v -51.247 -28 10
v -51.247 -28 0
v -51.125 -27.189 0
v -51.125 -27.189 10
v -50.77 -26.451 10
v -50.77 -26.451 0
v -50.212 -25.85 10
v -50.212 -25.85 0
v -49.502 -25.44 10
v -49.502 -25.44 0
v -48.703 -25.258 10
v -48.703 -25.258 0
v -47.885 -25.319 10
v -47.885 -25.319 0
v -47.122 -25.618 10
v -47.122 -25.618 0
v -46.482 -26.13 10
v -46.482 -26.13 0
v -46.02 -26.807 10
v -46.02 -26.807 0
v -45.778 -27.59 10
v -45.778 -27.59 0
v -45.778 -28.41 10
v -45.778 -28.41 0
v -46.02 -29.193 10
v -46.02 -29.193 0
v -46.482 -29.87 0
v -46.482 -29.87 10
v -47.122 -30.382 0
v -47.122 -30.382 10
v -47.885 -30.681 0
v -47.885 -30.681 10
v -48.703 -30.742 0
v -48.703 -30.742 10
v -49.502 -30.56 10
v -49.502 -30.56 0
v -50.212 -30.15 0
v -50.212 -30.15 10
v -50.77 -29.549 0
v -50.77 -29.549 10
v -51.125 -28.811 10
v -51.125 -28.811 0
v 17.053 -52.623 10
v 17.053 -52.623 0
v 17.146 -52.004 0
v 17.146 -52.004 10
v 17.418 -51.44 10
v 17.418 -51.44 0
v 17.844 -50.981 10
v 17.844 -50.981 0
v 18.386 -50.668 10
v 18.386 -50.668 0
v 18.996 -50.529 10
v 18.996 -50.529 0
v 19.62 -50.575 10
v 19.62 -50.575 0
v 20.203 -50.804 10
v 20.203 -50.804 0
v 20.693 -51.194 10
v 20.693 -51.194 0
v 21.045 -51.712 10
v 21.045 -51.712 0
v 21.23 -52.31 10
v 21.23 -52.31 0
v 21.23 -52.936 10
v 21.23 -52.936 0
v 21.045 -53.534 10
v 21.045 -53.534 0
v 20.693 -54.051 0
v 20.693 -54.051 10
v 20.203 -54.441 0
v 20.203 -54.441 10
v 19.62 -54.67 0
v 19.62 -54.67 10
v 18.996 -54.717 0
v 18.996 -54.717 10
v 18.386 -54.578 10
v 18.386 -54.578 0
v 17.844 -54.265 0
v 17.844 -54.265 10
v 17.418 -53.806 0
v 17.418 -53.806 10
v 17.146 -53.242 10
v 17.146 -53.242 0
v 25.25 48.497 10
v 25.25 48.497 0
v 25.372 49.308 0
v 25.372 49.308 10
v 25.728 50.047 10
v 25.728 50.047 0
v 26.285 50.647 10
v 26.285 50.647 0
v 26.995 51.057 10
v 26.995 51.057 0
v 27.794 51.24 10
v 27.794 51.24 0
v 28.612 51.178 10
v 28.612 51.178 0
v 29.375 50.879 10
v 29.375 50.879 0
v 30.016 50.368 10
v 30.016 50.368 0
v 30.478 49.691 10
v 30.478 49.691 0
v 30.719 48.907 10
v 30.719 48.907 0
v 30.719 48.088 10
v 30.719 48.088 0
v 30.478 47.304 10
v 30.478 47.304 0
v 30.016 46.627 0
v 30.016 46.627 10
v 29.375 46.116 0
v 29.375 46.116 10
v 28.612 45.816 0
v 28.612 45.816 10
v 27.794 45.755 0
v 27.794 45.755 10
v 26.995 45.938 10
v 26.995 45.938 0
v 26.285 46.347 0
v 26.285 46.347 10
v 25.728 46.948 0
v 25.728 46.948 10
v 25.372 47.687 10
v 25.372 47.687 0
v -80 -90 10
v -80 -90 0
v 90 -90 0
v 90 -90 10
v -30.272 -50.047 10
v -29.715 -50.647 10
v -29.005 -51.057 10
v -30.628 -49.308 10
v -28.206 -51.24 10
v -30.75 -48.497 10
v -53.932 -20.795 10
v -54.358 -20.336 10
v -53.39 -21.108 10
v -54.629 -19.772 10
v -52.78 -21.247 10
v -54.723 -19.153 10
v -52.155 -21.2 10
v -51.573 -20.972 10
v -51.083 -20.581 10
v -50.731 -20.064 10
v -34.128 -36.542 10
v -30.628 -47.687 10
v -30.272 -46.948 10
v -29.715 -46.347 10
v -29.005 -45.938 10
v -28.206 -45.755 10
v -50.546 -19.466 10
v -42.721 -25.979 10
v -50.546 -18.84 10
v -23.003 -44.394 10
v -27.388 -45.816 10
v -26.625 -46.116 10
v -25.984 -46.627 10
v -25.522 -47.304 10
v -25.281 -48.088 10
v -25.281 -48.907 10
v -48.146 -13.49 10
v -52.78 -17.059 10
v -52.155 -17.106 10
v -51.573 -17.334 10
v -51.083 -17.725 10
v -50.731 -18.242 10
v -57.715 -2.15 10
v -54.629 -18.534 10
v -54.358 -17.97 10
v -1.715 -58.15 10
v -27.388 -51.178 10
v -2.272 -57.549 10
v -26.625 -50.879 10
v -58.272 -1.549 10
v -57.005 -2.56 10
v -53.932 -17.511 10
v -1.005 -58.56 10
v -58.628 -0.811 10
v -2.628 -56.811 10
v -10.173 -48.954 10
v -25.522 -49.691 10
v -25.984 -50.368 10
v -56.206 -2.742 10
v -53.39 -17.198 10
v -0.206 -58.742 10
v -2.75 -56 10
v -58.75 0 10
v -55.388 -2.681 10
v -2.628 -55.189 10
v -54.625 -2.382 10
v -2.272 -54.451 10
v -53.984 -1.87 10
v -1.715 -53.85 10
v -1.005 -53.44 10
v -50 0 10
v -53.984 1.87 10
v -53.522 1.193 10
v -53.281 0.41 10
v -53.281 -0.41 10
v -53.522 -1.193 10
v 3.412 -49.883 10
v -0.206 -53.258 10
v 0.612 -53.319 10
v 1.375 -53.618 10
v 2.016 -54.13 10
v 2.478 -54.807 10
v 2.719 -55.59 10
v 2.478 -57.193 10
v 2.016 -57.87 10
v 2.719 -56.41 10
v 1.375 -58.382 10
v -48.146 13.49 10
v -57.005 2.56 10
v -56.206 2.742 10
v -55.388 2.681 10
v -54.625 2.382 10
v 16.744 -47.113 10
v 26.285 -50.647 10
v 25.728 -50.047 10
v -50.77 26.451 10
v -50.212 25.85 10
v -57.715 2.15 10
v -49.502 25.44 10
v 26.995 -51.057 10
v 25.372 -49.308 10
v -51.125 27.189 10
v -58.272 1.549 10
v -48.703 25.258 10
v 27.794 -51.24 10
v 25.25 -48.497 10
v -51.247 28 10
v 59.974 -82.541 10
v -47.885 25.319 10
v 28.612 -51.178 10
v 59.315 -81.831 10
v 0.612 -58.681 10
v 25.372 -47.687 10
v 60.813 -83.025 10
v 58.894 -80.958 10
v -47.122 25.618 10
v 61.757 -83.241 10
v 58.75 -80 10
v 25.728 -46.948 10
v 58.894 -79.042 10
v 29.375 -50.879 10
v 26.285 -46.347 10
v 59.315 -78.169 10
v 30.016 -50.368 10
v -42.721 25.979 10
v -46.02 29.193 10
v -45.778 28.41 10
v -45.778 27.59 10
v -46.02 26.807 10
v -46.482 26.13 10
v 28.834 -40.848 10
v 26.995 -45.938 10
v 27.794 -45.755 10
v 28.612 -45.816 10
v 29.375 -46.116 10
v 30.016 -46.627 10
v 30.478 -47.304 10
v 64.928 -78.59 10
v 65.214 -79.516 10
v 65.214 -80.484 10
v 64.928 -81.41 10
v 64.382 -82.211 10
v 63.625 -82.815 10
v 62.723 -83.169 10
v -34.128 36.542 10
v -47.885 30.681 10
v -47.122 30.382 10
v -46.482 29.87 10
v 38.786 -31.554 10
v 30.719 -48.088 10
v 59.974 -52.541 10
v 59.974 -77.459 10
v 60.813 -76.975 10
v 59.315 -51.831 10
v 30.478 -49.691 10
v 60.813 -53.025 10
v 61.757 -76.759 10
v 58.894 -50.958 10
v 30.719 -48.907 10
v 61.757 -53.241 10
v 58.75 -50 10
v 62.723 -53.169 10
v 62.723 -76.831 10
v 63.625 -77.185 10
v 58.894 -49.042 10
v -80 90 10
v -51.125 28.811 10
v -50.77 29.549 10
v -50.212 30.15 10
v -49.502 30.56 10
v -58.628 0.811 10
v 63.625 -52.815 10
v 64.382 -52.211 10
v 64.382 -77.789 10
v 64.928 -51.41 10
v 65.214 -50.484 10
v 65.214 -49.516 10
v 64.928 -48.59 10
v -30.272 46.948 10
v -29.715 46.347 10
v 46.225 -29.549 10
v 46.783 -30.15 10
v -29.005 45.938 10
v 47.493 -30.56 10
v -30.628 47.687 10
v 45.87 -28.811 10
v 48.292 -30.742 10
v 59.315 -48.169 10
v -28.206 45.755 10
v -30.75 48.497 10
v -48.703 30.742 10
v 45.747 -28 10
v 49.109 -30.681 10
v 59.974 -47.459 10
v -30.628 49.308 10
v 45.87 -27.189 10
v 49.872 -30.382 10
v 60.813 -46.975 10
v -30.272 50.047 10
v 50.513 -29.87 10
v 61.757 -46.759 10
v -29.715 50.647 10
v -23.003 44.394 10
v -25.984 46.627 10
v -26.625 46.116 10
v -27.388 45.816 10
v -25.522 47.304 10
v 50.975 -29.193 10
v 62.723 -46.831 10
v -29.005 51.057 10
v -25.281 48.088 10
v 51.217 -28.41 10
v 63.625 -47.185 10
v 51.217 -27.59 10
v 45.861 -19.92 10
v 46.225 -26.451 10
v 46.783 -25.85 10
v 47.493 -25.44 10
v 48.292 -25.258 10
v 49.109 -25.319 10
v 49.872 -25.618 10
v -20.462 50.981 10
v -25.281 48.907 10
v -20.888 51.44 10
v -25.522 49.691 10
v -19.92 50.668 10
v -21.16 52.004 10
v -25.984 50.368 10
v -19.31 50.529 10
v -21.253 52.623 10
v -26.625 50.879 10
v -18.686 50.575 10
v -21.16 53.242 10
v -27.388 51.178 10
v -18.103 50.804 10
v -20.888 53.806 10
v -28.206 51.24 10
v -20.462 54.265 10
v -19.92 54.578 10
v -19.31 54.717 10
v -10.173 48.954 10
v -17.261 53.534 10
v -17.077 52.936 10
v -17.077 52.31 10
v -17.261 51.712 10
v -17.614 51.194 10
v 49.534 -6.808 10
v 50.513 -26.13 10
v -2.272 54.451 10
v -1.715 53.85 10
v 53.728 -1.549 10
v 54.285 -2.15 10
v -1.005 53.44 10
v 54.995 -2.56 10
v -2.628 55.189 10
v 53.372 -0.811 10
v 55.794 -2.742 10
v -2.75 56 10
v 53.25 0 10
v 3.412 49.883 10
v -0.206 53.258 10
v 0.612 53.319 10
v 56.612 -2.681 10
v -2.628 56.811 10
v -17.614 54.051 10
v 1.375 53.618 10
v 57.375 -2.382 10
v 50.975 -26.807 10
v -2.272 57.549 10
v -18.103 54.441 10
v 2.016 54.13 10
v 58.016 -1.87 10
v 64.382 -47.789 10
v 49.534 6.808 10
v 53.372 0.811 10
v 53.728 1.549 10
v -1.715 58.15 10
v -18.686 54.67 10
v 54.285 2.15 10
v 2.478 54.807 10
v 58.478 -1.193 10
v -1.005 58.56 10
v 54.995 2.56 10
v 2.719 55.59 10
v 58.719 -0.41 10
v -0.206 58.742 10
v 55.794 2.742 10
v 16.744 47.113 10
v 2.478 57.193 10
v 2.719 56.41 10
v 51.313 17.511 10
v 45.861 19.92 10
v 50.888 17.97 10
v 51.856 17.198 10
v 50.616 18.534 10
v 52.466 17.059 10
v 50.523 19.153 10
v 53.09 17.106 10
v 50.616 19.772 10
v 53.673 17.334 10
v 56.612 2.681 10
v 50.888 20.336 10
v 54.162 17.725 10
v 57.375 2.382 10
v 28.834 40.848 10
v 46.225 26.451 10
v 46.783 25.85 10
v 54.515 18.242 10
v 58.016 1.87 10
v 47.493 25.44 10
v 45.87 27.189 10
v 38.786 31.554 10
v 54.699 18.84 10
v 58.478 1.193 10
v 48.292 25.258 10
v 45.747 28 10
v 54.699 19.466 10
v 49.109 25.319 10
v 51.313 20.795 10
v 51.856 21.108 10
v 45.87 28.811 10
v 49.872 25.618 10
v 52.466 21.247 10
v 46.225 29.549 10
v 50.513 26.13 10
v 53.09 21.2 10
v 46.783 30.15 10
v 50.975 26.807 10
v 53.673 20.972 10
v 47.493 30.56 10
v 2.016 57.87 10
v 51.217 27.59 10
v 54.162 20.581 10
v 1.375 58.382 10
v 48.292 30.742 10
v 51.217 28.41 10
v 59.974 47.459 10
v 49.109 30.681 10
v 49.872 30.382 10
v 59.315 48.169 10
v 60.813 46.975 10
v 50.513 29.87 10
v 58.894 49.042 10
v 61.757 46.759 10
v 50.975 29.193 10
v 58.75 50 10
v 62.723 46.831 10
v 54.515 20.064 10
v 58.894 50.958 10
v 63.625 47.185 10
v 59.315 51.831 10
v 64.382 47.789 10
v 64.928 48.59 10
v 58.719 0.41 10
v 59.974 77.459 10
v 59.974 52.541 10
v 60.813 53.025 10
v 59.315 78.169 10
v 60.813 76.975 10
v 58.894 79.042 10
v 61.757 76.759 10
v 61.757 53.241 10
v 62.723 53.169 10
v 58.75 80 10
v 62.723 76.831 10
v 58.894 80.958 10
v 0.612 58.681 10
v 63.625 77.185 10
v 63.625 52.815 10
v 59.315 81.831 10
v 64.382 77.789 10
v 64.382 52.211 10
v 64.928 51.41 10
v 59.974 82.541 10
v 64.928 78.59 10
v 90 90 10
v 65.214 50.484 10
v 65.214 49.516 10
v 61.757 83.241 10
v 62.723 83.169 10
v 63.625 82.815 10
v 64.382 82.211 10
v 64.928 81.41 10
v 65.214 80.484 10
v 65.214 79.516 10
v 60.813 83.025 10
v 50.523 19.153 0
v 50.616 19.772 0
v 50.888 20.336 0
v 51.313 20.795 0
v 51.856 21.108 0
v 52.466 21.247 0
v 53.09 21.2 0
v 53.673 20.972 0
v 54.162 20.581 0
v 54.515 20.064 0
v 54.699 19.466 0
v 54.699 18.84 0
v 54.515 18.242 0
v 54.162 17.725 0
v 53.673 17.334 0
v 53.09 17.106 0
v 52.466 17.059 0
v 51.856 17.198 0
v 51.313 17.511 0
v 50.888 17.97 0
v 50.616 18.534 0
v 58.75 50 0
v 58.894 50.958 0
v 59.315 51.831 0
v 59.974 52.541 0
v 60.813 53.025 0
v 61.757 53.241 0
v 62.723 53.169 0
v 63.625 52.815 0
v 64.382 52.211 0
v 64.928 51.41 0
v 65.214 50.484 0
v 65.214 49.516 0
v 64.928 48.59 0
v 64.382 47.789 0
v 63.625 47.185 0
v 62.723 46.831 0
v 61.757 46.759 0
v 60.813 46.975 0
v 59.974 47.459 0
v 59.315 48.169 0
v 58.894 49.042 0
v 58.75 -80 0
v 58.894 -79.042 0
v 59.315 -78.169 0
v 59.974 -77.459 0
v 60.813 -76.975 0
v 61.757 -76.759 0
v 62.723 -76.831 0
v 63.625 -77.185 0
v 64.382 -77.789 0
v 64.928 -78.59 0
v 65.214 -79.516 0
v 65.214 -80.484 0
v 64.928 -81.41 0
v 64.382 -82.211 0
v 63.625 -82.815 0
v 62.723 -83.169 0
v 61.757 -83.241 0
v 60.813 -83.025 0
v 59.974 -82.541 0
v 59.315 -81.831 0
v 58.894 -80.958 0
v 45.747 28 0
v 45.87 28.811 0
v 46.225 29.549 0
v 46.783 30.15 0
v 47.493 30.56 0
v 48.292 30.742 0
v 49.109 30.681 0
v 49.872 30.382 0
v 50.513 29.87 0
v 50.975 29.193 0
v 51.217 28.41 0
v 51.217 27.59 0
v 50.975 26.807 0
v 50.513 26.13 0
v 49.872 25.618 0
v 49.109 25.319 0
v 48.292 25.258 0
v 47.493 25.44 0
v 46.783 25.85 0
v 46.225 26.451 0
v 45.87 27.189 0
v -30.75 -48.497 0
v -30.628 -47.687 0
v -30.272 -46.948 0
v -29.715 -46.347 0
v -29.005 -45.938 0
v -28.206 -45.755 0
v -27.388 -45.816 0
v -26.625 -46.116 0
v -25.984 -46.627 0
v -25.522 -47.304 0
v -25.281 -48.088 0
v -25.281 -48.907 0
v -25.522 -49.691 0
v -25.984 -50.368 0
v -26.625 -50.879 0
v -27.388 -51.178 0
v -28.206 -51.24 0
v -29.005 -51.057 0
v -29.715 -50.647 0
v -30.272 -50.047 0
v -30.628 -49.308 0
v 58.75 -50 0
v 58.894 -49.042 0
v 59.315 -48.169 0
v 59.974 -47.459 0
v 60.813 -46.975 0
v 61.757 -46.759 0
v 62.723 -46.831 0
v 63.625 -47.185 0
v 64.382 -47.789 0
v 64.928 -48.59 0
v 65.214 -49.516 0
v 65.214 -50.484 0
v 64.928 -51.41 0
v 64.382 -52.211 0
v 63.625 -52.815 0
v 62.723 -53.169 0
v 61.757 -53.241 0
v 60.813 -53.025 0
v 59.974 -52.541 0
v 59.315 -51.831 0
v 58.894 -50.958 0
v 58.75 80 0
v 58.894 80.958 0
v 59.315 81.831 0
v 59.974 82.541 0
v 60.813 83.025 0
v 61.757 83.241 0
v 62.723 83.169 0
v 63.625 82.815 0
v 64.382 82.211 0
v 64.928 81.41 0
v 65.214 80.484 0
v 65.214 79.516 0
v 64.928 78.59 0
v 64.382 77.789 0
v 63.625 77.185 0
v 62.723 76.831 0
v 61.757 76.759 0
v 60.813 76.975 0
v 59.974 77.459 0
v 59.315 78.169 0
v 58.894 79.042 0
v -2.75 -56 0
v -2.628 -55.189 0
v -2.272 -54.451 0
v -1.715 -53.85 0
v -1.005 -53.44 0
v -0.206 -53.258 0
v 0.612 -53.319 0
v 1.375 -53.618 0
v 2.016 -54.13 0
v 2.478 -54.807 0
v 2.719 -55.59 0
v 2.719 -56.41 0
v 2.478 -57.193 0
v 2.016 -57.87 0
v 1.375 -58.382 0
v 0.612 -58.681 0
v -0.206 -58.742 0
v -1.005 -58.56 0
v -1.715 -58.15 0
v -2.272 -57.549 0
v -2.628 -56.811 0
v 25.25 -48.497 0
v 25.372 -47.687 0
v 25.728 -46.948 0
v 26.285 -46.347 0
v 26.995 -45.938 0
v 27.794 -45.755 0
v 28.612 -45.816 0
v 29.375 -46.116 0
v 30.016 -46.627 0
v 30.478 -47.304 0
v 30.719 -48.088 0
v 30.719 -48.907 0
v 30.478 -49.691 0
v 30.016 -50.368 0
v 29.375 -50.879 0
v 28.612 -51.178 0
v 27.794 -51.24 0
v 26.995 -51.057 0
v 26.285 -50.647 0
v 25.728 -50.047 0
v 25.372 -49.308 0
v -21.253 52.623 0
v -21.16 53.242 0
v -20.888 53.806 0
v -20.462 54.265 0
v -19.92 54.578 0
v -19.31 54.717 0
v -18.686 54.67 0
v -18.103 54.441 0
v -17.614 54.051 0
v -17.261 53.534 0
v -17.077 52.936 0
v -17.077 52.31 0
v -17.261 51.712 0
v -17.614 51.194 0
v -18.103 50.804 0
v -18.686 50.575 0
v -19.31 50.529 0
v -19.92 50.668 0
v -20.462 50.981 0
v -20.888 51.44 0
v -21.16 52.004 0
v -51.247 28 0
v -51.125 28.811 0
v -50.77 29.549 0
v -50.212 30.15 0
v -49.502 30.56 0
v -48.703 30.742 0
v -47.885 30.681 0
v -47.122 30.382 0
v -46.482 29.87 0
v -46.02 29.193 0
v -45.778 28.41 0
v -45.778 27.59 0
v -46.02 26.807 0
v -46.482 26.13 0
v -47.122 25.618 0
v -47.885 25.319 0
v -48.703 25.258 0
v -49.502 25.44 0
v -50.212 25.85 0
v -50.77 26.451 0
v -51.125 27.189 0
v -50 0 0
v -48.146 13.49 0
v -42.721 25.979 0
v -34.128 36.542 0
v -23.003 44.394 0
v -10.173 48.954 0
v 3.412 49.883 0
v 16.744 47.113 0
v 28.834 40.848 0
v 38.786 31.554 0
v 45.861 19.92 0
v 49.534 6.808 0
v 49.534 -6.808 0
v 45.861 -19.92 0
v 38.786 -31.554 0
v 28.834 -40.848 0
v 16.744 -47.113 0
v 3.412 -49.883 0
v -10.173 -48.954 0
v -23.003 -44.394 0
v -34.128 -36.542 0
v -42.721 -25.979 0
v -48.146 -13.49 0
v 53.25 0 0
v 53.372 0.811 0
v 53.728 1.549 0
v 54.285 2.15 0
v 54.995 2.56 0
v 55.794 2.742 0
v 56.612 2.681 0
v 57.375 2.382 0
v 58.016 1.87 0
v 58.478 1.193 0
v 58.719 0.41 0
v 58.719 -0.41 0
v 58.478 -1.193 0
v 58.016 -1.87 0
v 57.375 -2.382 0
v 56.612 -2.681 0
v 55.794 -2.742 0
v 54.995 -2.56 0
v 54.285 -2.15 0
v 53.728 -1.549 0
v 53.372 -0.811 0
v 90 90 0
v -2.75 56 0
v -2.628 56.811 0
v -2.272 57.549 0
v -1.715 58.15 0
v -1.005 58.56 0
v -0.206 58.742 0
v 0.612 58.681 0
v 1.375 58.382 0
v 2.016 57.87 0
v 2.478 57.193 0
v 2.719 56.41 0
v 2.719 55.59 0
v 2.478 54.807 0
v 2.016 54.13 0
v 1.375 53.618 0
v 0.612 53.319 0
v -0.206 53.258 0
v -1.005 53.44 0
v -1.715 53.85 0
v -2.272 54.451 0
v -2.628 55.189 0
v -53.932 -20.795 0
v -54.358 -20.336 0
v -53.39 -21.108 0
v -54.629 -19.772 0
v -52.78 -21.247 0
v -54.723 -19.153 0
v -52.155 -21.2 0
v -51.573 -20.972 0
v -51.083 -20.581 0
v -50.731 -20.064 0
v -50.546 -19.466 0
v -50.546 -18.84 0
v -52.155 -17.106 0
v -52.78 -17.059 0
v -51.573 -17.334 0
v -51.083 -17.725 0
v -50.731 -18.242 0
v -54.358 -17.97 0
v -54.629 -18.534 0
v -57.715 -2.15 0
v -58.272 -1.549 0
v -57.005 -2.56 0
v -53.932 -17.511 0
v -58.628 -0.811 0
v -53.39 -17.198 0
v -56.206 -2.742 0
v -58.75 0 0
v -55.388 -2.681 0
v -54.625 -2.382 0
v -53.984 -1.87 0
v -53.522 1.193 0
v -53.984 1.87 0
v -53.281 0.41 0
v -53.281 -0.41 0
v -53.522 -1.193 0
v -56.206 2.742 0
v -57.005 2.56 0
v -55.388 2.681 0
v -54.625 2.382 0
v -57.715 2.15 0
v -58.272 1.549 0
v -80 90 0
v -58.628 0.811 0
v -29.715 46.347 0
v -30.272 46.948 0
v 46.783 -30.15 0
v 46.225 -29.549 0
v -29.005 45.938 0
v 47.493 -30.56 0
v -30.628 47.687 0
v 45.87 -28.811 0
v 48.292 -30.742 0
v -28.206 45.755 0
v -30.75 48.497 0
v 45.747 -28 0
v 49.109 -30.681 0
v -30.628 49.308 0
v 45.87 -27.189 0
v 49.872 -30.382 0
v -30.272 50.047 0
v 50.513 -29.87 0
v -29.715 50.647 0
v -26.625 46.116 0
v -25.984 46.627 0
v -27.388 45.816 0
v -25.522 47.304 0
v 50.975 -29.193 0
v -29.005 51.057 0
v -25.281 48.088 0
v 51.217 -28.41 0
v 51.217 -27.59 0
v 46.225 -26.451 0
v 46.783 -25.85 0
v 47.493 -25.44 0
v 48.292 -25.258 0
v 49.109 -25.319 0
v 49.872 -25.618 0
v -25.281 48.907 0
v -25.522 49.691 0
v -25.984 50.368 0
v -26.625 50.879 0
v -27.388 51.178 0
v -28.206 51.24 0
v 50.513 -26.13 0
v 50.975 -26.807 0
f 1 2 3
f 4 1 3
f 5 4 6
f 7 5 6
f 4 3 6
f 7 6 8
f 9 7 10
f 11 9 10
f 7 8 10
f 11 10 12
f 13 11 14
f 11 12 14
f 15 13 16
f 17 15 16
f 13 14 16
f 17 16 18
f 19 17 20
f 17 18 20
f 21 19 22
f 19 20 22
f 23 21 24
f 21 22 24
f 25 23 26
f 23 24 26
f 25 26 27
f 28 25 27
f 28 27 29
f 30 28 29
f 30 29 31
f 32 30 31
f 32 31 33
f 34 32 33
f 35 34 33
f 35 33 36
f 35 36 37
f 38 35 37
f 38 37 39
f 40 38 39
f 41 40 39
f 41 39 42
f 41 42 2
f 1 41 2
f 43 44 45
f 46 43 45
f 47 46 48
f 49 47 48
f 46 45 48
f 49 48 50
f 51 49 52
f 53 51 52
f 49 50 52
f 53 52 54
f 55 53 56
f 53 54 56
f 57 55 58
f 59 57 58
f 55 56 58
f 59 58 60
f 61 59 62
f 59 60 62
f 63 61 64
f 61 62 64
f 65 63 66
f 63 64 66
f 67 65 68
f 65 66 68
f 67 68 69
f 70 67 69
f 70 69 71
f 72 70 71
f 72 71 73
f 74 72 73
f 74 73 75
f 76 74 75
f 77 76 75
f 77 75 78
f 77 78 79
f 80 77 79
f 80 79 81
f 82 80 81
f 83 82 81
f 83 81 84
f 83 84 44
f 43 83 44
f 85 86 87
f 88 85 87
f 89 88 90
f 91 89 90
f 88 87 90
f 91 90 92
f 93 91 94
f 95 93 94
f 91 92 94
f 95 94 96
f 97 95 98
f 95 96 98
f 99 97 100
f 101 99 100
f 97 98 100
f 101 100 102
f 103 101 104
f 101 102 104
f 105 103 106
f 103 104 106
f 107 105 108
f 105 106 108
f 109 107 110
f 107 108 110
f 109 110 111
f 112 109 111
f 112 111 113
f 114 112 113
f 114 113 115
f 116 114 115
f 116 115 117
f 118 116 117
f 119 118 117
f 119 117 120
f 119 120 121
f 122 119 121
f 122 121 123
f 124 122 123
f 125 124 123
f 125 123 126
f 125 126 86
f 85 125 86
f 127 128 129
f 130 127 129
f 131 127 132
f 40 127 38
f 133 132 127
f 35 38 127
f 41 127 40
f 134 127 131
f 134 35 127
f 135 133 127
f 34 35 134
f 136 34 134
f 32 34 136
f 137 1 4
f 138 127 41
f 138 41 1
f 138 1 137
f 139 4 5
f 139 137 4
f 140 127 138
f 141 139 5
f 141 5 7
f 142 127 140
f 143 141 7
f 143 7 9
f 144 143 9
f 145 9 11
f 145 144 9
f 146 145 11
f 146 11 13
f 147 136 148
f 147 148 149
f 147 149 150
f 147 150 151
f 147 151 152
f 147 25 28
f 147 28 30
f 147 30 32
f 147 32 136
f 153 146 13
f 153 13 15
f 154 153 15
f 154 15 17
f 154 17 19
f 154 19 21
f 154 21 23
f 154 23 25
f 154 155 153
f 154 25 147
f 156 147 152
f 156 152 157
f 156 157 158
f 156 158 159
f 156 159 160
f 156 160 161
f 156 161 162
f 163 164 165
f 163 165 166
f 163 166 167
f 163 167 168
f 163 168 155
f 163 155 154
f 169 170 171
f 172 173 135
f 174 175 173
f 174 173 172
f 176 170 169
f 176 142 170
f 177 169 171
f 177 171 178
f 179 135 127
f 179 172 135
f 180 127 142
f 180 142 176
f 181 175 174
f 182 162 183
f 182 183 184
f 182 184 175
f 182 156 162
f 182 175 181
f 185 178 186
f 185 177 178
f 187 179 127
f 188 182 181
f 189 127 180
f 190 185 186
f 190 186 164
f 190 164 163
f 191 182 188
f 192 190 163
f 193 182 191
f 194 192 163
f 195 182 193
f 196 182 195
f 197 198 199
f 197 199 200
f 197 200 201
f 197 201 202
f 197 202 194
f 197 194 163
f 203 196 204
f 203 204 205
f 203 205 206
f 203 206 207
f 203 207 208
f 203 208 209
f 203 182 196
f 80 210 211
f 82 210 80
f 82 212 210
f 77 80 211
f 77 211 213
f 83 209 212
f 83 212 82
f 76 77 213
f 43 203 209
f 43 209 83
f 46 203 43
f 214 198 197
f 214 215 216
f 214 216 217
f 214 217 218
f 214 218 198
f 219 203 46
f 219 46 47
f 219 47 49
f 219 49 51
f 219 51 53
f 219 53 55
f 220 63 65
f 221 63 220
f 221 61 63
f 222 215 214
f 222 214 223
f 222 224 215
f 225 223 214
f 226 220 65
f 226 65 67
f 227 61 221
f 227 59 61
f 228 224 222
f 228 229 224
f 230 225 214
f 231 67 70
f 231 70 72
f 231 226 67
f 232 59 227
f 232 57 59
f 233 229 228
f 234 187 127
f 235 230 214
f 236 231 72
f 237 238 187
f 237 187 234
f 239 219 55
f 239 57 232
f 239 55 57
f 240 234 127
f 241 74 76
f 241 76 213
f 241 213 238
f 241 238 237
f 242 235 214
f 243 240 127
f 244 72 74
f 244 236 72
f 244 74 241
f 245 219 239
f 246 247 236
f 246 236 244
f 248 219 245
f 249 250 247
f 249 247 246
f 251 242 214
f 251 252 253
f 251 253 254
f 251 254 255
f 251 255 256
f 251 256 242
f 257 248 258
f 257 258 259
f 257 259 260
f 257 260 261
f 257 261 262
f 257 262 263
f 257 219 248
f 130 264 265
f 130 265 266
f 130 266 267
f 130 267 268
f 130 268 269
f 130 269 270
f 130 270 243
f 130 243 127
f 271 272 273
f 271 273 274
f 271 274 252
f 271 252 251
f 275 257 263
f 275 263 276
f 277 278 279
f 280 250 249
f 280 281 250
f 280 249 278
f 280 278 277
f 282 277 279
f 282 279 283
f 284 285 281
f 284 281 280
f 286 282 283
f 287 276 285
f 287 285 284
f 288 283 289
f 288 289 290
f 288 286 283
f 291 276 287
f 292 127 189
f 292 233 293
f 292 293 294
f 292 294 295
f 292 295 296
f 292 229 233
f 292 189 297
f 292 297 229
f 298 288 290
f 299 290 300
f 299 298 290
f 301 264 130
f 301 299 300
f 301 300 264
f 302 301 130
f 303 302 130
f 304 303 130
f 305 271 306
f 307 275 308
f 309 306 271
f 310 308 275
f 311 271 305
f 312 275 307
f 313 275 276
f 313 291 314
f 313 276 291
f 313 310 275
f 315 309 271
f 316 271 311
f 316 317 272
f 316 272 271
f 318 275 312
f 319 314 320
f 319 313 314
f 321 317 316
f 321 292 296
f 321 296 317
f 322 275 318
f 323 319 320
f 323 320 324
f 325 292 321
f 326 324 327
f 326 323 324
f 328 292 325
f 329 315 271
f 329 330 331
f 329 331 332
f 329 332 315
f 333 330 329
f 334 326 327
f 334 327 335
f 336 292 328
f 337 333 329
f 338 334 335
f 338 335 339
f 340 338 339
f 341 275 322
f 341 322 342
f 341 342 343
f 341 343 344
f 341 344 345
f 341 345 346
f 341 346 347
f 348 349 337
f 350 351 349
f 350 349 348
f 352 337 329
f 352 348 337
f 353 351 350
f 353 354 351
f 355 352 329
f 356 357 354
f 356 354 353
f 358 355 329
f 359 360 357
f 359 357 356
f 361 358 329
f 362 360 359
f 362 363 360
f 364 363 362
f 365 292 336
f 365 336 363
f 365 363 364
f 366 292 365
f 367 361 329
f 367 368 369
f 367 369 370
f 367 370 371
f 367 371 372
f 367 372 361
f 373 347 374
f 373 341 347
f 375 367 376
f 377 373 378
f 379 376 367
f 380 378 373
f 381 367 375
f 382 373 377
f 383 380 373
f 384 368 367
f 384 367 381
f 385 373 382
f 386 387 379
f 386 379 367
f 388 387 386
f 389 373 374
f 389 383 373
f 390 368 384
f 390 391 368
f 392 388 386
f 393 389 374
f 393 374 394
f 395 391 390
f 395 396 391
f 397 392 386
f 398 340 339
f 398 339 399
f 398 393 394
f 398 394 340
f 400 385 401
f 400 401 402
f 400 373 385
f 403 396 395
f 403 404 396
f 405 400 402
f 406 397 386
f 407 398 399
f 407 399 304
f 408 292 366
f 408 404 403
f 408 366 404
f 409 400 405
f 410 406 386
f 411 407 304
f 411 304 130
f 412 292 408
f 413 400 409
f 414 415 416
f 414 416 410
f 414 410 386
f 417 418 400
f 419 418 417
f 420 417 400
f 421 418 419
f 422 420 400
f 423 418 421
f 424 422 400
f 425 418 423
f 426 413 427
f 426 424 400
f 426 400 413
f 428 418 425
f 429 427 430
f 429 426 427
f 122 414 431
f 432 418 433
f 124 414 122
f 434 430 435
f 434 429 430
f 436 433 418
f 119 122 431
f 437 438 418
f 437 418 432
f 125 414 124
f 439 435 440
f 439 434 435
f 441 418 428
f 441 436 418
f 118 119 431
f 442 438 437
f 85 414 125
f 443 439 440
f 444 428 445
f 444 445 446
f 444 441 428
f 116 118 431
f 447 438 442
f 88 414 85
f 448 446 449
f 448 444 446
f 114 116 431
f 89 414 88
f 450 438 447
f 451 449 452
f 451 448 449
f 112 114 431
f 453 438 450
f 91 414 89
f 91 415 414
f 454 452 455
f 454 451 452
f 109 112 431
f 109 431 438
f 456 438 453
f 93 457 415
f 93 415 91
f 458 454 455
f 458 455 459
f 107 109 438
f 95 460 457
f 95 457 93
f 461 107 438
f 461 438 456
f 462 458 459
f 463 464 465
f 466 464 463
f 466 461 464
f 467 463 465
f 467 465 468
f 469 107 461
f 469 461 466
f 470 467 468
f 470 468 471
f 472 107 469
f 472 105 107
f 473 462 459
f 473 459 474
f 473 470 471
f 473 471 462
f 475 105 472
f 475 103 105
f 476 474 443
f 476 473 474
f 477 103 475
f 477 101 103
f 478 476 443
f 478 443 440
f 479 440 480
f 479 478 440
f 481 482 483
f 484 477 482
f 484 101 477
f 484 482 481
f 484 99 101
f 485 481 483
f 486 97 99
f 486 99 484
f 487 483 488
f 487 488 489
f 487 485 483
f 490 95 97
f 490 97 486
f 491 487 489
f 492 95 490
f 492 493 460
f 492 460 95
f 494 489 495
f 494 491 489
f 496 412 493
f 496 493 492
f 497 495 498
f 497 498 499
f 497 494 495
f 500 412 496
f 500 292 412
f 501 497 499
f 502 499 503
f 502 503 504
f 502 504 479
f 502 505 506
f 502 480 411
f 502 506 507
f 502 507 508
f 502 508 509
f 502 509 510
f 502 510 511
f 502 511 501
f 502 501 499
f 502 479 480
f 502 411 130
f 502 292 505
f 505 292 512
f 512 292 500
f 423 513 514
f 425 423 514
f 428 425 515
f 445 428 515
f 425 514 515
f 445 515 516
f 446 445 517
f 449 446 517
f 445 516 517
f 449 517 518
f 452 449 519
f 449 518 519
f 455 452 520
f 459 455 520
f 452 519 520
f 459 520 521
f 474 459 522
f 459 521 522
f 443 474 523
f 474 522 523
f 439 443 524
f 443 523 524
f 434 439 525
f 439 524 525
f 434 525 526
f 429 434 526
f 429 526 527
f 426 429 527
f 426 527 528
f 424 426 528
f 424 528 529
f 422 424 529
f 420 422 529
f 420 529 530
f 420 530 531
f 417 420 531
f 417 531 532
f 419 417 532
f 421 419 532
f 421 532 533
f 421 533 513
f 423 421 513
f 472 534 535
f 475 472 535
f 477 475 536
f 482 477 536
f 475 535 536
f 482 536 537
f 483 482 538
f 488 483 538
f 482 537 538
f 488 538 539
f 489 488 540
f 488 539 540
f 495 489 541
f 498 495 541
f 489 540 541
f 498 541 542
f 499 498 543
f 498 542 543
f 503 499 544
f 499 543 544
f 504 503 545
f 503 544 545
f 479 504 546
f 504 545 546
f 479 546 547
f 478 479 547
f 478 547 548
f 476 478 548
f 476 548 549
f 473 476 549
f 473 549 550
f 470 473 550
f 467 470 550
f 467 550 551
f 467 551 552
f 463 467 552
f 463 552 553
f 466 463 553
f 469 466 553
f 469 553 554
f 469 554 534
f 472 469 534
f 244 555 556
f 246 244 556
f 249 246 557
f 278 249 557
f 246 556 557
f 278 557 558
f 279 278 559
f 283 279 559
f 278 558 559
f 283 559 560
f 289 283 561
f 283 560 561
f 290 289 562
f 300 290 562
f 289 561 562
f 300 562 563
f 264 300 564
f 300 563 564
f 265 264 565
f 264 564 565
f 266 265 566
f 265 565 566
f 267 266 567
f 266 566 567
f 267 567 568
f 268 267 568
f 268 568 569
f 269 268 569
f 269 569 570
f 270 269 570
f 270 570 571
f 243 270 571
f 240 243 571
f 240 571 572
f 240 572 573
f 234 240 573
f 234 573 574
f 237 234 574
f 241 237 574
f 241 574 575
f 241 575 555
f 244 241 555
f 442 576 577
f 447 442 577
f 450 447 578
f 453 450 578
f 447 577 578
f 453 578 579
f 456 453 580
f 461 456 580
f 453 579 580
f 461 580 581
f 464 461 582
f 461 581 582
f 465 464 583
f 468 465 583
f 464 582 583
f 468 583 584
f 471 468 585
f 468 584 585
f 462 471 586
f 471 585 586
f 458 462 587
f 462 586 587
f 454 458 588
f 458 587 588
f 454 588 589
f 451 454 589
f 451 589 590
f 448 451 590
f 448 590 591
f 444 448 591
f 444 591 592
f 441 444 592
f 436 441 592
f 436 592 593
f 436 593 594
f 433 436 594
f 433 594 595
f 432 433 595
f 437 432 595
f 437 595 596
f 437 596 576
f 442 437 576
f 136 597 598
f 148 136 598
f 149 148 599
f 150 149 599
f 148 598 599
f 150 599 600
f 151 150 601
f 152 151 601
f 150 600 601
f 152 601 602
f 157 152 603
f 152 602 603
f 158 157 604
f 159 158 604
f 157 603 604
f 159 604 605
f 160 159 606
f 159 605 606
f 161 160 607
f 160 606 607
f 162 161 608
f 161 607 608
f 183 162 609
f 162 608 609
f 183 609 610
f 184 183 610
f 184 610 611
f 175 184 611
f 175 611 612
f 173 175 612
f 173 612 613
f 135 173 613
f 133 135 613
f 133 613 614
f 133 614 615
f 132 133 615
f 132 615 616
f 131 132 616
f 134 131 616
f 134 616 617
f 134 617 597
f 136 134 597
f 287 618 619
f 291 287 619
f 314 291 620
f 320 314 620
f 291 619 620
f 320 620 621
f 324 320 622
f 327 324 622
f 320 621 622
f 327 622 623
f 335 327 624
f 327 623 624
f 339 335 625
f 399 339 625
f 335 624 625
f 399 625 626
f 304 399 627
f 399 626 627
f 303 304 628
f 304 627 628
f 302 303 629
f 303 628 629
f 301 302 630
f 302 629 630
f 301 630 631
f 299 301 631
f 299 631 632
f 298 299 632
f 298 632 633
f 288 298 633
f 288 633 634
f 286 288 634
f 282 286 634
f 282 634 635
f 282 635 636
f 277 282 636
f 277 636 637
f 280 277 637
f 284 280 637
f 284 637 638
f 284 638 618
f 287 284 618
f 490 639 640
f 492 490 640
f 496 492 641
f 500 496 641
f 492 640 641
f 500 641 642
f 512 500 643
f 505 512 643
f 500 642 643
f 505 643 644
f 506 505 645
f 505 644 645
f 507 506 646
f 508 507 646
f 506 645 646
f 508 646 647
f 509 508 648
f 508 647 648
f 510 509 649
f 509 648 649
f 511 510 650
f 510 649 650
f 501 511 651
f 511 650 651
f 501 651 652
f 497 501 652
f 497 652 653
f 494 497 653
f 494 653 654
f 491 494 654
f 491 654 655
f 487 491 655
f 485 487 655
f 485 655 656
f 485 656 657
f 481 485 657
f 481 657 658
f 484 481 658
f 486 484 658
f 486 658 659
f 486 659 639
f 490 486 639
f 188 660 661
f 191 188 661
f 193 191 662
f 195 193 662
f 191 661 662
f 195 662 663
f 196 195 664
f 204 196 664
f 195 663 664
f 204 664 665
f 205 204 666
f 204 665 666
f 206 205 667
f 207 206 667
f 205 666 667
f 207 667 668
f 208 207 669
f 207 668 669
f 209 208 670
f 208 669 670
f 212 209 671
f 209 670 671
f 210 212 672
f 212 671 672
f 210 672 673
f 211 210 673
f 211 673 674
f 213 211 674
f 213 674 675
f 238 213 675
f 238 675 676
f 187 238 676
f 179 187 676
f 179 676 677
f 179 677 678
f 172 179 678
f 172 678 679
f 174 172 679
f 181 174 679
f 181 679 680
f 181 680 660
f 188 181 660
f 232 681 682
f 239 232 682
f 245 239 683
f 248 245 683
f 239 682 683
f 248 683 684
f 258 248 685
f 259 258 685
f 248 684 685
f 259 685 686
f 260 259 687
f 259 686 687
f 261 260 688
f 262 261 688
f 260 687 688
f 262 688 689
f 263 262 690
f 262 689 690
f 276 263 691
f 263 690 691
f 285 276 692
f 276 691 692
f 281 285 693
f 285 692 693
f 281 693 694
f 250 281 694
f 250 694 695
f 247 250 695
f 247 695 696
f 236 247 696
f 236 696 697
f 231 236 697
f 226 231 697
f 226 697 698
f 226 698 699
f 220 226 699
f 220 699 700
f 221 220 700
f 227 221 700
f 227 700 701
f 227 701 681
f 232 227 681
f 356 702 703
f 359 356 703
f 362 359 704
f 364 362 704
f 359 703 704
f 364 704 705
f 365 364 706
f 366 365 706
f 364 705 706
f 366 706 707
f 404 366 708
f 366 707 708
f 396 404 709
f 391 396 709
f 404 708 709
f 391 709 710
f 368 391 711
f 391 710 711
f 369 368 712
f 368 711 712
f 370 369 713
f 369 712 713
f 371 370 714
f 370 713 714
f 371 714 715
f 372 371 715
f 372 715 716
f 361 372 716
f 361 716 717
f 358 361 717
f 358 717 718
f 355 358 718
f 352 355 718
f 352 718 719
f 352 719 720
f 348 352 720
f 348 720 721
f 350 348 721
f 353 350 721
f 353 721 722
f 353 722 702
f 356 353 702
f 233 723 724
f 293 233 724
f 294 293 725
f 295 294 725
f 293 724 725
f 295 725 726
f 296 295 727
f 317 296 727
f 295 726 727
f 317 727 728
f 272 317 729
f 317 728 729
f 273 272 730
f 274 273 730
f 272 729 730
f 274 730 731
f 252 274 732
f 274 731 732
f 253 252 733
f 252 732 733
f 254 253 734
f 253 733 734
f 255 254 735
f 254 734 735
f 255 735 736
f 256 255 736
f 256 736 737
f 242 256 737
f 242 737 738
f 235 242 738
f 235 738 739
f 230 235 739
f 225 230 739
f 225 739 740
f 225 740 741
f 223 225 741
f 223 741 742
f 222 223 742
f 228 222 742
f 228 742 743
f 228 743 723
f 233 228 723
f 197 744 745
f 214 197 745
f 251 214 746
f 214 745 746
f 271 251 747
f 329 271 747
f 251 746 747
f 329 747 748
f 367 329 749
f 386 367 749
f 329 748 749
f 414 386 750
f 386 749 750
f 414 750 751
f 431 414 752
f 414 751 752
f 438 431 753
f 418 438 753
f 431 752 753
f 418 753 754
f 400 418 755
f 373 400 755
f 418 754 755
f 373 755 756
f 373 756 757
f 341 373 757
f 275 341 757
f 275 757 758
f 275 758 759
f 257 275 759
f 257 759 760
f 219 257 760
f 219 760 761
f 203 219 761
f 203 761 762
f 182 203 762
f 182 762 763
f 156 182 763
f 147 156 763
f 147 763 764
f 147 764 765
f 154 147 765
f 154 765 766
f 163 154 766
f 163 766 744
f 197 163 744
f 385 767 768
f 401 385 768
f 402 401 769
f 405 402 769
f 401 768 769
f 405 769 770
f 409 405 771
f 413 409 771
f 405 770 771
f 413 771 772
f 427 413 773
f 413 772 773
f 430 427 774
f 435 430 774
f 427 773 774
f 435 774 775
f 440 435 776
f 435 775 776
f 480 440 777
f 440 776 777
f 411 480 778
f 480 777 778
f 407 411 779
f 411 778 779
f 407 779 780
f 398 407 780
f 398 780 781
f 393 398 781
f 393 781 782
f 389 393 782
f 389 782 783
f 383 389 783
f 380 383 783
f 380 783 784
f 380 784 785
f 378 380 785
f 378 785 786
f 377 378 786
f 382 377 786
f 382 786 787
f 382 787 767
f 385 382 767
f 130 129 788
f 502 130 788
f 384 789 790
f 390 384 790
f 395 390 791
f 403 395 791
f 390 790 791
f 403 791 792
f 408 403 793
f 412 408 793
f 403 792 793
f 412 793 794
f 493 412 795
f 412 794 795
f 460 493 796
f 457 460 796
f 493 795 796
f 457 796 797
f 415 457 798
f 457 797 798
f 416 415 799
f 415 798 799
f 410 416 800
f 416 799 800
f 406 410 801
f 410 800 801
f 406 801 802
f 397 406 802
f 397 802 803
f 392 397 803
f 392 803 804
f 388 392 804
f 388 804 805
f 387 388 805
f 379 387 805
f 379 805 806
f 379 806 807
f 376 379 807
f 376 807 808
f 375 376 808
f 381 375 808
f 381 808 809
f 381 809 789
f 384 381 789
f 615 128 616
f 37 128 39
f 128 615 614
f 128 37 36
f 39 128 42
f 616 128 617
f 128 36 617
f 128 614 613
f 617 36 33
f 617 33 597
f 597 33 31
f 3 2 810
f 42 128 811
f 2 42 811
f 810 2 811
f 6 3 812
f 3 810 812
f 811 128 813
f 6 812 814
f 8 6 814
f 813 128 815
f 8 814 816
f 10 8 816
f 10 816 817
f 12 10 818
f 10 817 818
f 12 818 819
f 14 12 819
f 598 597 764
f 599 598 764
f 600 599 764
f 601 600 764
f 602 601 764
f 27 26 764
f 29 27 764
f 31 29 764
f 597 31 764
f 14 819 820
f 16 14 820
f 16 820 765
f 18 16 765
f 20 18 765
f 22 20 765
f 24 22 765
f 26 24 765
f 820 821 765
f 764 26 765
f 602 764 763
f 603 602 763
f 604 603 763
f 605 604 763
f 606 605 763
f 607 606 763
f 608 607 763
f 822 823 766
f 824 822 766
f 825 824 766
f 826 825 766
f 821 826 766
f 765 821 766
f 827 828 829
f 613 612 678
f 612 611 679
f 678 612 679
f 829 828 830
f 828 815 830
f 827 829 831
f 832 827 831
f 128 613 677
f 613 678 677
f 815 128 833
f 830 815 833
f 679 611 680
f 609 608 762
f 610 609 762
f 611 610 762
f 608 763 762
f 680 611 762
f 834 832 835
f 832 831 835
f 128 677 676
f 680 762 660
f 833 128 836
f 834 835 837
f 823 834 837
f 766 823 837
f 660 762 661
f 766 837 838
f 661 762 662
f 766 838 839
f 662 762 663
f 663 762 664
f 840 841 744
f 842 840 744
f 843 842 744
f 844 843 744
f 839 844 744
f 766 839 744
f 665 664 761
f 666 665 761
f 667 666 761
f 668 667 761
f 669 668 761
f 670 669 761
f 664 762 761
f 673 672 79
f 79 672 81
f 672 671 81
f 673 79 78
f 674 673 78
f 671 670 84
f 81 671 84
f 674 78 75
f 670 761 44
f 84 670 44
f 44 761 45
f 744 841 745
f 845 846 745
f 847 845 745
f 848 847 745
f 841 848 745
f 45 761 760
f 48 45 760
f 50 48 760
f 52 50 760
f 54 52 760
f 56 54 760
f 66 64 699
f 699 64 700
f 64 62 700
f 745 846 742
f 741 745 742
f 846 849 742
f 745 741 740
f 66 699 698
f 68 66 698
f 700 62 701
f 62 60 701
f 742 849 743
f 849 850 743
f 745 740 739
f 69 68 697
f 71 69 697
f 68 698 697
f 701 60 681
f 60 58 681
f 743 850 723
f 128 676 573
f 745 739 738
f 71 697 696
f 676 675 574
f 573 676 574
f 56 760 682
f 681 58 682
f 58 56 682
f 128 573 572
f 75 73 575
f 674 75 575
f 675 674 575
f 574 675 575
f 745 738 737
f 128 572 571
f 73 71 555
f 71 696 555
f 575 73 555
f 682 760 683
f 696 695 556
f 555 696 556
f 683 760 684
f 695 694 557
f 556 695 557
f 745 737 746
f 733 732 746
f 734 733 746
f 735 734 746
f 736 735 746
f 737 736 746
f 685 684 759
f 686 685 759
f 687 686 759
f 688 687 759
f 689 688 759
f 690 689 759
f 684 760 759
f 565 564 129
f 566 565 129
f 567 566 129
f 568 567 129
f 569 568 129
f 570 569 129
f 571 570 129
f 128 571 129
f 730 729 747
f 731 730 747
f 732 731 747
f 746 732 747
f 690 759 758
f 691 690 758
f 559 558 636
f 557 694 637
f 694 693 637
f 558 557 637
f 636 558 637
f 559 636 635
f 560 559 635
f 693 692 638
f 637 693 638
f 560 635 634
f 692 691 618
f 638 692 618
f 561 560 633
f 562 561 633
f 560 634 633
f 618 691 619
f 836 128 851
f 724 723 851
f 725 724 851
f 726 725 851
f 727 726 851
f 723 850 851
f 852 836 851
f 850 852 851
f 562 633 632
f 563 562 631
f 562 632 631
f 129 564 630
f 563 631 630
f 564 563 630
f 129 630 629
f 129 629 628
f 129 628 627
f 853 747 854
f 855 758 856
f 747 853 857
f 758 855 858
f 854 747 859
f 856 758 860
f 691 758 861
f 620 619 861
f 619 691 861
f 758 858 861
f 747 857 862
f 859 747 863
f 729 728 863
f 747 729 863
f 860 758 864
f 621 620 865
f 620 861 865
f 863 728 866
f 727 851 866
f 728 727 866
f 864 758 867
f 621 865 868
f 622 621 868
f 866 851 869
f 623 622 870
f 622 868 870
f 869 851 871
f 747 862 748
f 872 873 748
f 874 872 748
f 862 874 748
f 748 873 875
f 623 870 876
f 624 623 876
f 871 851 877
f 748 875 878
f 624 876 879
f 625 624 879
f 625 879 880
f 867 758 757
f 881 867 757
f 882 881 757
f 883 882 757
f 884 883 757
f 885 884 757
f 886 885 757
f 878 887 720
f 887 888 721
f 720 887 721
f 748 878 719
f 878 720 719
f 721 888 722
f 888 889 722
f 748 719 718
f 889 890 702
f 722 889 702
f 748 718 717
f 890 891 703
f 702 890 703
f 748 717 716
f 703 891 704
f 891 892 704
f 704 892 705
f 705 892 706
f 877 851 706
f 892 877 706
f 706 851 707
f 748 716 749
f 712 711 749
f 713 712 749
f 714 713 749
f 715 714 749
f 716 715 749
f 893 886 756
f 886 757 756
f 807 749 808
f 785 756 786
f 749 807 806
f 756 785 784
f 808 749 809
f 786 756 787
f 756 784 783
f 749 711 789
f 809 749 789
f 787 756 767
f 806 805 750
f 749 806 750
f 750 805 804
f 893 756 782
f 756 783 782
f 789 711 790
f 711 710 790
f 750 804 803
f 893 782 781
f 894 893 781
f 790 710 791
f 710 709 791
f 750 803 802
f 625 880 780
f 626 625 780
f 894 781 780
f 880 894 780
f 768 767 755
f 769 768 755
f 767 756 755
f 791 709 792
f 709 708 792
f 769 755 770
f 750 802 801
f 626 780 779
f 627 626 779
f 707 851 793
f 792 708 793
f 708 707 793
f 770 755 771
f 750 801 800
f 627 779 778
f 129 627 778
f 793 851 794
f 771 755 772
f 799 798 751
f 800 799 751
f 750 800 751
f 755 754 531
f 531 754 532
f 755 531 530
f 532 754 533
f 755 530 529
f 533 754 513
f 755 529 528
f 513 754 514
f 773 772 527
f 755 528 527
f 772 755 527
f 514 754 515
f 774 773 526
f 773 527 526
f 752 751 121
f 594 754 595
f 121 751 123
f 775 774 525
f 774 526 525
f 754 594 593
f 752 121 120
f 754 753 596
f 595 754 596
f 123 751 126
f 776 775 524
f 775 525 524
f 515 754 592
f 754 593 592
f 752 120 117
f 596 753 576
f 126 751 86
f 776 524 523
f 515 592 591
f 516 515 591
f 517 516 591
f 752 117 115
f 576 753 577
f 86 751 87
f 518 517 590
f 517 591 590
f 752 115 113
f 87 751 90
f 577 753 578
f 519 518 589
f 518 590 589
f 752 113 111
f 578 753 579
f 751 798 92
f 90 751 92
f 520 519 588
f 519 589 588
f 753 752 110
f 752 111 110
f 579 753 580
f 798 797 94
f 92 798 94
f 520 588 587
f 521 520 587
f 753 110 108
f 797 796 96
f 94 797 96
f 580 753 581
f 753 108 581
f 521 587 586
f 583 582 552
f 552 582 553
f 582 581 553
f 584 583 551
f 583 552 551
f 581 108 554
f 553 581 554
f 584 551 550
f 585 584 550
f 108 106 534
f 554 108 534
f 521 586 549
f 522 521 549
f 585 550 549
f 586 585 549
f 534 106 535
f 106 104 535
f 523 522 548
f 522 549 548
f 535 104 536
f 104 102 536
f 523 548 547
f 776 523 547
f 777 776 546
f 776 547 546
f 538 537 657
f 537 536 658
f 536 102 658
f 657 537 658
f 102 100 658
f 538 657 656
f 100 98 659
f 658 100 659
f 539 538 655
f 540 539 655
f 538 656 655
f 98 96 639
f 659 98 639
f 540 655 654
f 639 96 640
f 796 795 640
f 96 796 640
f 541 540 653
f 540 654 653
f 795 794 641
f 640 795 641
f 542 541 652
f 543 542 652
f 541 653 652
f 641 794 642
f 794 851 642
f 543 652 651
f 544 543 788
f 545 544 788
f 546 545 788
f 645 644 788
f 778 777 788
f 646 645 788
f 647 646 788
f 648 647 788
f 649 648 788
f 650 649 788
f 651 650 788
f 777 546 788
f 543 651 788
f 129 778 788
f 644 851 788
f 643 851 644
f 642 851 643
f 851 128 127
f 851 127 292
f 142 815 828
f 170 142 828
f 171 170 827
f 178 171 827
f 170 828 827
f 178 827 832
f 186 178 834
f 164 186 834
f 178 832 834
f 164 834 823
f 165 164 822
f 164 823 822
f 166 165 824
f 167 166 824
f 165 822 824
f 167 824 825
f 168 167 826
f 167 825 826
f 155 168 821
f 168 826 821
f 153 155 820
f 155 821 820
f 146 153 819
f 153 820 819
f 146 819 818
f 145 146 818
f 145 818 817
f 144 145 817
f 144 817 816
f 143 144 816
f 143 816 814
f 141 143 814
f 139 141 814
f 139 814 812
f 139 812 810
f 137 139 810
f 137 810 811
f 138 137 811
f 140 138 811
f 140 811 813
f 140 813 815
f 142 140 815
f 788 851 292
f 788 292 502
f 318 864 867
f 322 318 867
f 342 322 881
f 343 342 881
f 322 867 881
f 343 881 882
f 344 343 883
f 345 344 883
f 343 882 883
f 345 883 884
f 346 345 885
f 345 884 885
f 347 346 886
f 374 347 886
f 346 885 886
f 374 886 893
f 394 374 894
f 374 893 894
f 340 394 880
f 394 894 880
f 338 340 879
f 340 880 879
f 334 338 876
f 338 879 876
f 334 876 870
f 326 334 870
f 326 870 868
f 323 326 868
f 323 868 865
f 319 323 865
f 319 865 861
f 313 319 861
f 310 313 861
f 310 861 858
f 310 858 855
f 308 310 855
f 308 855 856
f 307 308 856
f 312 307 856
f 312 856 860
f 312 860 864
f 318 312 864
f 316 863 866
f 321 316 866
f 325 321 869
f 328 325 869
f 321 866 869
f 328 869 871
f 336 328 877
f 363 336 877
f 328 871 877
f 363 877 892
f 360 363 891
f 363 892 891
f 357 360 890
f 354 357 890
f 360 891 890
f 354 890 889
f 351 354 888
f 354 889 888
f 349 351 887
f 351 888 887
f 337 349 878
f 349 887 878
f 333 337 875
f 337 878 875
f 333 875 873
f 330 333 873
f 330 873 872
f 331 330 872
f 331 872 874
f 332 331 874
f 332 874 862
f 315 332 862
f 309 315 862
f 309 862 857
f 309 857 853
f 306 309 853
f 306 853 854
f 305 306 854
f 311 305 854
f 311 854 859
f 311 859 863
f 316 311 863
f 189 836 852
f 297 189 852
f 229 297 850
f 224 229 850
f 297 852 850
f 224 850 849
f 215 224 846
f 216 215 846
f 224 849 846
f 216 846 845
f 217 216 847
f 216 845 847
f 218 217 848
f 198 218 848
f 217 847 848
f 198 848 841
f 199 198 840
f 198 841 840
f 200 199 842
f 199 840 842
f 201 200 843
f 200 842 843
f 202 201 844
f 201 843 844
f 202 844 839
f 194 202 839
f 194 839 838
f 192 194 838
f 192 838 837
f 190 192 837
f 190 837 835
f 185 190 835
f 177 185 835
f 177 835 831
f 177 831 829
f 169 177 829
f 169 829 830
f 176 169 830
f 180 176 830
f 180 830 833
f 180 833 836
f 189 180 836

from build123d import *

# Parameters (mm, degrees)
SKETCH_1_W          = 170
SKETCH_1_H          = 180
EXTRUDE_1_DEPTH     = 10
SKETCH_2_R          = 50
SKETCH_2_R_2        = 2.75
SKETCH_2_R_3        = 2.1
SKETCH_2_R_4        = 3.25
CUT_EXTRUDE_1_DEPTH = 11


with BuildPart() as part:
    # 草图1 → 凸台-拉伸1 (new body)
    with BuildSketch(Plane.XY):
        with Locations((5, 0)):
            Rectangle(SKETCH_1_W, SKETCH_1_H)
    extrude(amount=EXTRUDE_1_DEPTH)

    # 草图2 → 切除-拉伸1 (cut)
    with BuildSketch(Plane(origin=(0, 0, 0), x_dir=(-1, 0, 0), z_dir=(0, 0, -1))):
        Circle(SKETCH_2_R)
        with Locations((-56, 0)):
            Circle(SKETCH_2_R_2)
        with Locations((-48.497422612, 28)):
            Circle(SKETCH_2_R_2)
        with Locations((-28, 48.497422612)):
            Circle(SKETCH_2_R_2)
        with Locations((0, 56)):
            Circle(SKETCH_2_R_2)
        with Locations((28, 48.497422612)):
            Circle(SKETCH_2_R_2)
        with Locations((48.497422612, 28)):
            Circle(SKETCH_2_R_2)
        with Locations((56, 0)):
            Circle(SKETCH_2_R_2)
        with Locations((48.497422612, -28)):
            Circle(SKETCH_2_R_2)
        with Locations((28, -48.497422612)):
            Circle(SKETCH_2_R_2)
        with Locations((0, -56)):
            Circle(SKETCH_2_R_2)
        with Locations((-28, -48.497422612)):
            Circle(SKETCH_2_R_2)
        with Locations((-48.497422612, -28)):
            Circle(SKETCH_2_R_2)
        with Locations((-52.622786764, 19.153128026)):
            Circle(SKETCH_2_R_3)
        with Locations((19.153128026, 52.622786764)):
            Circle(SKETCH_2_R_3)
        with Locations((52.622786764, -19.153128026)):
            Circle(SKETCH_2_R_3)
        with Locations((-19.153128026, -52.622786764)):
            Circle(SKETCH_2_R_3)
        with Locations((-62, -80)):
            Circle(SKETCH_2_R_4)
        with Locations((-62, -50)):
            Circle(SKETCH_2_R_4)
        with Locations((-62, 50)):
            Circle(SKETCH_2_R_4)
        with Locations((-62, 80)):
            Circle(SKETCH_2_R_4)
    extrude(amount=-CUT_EXTRUDE_1_DEPTH, mode=Mode.SUBTRACT)


solid = part.part
